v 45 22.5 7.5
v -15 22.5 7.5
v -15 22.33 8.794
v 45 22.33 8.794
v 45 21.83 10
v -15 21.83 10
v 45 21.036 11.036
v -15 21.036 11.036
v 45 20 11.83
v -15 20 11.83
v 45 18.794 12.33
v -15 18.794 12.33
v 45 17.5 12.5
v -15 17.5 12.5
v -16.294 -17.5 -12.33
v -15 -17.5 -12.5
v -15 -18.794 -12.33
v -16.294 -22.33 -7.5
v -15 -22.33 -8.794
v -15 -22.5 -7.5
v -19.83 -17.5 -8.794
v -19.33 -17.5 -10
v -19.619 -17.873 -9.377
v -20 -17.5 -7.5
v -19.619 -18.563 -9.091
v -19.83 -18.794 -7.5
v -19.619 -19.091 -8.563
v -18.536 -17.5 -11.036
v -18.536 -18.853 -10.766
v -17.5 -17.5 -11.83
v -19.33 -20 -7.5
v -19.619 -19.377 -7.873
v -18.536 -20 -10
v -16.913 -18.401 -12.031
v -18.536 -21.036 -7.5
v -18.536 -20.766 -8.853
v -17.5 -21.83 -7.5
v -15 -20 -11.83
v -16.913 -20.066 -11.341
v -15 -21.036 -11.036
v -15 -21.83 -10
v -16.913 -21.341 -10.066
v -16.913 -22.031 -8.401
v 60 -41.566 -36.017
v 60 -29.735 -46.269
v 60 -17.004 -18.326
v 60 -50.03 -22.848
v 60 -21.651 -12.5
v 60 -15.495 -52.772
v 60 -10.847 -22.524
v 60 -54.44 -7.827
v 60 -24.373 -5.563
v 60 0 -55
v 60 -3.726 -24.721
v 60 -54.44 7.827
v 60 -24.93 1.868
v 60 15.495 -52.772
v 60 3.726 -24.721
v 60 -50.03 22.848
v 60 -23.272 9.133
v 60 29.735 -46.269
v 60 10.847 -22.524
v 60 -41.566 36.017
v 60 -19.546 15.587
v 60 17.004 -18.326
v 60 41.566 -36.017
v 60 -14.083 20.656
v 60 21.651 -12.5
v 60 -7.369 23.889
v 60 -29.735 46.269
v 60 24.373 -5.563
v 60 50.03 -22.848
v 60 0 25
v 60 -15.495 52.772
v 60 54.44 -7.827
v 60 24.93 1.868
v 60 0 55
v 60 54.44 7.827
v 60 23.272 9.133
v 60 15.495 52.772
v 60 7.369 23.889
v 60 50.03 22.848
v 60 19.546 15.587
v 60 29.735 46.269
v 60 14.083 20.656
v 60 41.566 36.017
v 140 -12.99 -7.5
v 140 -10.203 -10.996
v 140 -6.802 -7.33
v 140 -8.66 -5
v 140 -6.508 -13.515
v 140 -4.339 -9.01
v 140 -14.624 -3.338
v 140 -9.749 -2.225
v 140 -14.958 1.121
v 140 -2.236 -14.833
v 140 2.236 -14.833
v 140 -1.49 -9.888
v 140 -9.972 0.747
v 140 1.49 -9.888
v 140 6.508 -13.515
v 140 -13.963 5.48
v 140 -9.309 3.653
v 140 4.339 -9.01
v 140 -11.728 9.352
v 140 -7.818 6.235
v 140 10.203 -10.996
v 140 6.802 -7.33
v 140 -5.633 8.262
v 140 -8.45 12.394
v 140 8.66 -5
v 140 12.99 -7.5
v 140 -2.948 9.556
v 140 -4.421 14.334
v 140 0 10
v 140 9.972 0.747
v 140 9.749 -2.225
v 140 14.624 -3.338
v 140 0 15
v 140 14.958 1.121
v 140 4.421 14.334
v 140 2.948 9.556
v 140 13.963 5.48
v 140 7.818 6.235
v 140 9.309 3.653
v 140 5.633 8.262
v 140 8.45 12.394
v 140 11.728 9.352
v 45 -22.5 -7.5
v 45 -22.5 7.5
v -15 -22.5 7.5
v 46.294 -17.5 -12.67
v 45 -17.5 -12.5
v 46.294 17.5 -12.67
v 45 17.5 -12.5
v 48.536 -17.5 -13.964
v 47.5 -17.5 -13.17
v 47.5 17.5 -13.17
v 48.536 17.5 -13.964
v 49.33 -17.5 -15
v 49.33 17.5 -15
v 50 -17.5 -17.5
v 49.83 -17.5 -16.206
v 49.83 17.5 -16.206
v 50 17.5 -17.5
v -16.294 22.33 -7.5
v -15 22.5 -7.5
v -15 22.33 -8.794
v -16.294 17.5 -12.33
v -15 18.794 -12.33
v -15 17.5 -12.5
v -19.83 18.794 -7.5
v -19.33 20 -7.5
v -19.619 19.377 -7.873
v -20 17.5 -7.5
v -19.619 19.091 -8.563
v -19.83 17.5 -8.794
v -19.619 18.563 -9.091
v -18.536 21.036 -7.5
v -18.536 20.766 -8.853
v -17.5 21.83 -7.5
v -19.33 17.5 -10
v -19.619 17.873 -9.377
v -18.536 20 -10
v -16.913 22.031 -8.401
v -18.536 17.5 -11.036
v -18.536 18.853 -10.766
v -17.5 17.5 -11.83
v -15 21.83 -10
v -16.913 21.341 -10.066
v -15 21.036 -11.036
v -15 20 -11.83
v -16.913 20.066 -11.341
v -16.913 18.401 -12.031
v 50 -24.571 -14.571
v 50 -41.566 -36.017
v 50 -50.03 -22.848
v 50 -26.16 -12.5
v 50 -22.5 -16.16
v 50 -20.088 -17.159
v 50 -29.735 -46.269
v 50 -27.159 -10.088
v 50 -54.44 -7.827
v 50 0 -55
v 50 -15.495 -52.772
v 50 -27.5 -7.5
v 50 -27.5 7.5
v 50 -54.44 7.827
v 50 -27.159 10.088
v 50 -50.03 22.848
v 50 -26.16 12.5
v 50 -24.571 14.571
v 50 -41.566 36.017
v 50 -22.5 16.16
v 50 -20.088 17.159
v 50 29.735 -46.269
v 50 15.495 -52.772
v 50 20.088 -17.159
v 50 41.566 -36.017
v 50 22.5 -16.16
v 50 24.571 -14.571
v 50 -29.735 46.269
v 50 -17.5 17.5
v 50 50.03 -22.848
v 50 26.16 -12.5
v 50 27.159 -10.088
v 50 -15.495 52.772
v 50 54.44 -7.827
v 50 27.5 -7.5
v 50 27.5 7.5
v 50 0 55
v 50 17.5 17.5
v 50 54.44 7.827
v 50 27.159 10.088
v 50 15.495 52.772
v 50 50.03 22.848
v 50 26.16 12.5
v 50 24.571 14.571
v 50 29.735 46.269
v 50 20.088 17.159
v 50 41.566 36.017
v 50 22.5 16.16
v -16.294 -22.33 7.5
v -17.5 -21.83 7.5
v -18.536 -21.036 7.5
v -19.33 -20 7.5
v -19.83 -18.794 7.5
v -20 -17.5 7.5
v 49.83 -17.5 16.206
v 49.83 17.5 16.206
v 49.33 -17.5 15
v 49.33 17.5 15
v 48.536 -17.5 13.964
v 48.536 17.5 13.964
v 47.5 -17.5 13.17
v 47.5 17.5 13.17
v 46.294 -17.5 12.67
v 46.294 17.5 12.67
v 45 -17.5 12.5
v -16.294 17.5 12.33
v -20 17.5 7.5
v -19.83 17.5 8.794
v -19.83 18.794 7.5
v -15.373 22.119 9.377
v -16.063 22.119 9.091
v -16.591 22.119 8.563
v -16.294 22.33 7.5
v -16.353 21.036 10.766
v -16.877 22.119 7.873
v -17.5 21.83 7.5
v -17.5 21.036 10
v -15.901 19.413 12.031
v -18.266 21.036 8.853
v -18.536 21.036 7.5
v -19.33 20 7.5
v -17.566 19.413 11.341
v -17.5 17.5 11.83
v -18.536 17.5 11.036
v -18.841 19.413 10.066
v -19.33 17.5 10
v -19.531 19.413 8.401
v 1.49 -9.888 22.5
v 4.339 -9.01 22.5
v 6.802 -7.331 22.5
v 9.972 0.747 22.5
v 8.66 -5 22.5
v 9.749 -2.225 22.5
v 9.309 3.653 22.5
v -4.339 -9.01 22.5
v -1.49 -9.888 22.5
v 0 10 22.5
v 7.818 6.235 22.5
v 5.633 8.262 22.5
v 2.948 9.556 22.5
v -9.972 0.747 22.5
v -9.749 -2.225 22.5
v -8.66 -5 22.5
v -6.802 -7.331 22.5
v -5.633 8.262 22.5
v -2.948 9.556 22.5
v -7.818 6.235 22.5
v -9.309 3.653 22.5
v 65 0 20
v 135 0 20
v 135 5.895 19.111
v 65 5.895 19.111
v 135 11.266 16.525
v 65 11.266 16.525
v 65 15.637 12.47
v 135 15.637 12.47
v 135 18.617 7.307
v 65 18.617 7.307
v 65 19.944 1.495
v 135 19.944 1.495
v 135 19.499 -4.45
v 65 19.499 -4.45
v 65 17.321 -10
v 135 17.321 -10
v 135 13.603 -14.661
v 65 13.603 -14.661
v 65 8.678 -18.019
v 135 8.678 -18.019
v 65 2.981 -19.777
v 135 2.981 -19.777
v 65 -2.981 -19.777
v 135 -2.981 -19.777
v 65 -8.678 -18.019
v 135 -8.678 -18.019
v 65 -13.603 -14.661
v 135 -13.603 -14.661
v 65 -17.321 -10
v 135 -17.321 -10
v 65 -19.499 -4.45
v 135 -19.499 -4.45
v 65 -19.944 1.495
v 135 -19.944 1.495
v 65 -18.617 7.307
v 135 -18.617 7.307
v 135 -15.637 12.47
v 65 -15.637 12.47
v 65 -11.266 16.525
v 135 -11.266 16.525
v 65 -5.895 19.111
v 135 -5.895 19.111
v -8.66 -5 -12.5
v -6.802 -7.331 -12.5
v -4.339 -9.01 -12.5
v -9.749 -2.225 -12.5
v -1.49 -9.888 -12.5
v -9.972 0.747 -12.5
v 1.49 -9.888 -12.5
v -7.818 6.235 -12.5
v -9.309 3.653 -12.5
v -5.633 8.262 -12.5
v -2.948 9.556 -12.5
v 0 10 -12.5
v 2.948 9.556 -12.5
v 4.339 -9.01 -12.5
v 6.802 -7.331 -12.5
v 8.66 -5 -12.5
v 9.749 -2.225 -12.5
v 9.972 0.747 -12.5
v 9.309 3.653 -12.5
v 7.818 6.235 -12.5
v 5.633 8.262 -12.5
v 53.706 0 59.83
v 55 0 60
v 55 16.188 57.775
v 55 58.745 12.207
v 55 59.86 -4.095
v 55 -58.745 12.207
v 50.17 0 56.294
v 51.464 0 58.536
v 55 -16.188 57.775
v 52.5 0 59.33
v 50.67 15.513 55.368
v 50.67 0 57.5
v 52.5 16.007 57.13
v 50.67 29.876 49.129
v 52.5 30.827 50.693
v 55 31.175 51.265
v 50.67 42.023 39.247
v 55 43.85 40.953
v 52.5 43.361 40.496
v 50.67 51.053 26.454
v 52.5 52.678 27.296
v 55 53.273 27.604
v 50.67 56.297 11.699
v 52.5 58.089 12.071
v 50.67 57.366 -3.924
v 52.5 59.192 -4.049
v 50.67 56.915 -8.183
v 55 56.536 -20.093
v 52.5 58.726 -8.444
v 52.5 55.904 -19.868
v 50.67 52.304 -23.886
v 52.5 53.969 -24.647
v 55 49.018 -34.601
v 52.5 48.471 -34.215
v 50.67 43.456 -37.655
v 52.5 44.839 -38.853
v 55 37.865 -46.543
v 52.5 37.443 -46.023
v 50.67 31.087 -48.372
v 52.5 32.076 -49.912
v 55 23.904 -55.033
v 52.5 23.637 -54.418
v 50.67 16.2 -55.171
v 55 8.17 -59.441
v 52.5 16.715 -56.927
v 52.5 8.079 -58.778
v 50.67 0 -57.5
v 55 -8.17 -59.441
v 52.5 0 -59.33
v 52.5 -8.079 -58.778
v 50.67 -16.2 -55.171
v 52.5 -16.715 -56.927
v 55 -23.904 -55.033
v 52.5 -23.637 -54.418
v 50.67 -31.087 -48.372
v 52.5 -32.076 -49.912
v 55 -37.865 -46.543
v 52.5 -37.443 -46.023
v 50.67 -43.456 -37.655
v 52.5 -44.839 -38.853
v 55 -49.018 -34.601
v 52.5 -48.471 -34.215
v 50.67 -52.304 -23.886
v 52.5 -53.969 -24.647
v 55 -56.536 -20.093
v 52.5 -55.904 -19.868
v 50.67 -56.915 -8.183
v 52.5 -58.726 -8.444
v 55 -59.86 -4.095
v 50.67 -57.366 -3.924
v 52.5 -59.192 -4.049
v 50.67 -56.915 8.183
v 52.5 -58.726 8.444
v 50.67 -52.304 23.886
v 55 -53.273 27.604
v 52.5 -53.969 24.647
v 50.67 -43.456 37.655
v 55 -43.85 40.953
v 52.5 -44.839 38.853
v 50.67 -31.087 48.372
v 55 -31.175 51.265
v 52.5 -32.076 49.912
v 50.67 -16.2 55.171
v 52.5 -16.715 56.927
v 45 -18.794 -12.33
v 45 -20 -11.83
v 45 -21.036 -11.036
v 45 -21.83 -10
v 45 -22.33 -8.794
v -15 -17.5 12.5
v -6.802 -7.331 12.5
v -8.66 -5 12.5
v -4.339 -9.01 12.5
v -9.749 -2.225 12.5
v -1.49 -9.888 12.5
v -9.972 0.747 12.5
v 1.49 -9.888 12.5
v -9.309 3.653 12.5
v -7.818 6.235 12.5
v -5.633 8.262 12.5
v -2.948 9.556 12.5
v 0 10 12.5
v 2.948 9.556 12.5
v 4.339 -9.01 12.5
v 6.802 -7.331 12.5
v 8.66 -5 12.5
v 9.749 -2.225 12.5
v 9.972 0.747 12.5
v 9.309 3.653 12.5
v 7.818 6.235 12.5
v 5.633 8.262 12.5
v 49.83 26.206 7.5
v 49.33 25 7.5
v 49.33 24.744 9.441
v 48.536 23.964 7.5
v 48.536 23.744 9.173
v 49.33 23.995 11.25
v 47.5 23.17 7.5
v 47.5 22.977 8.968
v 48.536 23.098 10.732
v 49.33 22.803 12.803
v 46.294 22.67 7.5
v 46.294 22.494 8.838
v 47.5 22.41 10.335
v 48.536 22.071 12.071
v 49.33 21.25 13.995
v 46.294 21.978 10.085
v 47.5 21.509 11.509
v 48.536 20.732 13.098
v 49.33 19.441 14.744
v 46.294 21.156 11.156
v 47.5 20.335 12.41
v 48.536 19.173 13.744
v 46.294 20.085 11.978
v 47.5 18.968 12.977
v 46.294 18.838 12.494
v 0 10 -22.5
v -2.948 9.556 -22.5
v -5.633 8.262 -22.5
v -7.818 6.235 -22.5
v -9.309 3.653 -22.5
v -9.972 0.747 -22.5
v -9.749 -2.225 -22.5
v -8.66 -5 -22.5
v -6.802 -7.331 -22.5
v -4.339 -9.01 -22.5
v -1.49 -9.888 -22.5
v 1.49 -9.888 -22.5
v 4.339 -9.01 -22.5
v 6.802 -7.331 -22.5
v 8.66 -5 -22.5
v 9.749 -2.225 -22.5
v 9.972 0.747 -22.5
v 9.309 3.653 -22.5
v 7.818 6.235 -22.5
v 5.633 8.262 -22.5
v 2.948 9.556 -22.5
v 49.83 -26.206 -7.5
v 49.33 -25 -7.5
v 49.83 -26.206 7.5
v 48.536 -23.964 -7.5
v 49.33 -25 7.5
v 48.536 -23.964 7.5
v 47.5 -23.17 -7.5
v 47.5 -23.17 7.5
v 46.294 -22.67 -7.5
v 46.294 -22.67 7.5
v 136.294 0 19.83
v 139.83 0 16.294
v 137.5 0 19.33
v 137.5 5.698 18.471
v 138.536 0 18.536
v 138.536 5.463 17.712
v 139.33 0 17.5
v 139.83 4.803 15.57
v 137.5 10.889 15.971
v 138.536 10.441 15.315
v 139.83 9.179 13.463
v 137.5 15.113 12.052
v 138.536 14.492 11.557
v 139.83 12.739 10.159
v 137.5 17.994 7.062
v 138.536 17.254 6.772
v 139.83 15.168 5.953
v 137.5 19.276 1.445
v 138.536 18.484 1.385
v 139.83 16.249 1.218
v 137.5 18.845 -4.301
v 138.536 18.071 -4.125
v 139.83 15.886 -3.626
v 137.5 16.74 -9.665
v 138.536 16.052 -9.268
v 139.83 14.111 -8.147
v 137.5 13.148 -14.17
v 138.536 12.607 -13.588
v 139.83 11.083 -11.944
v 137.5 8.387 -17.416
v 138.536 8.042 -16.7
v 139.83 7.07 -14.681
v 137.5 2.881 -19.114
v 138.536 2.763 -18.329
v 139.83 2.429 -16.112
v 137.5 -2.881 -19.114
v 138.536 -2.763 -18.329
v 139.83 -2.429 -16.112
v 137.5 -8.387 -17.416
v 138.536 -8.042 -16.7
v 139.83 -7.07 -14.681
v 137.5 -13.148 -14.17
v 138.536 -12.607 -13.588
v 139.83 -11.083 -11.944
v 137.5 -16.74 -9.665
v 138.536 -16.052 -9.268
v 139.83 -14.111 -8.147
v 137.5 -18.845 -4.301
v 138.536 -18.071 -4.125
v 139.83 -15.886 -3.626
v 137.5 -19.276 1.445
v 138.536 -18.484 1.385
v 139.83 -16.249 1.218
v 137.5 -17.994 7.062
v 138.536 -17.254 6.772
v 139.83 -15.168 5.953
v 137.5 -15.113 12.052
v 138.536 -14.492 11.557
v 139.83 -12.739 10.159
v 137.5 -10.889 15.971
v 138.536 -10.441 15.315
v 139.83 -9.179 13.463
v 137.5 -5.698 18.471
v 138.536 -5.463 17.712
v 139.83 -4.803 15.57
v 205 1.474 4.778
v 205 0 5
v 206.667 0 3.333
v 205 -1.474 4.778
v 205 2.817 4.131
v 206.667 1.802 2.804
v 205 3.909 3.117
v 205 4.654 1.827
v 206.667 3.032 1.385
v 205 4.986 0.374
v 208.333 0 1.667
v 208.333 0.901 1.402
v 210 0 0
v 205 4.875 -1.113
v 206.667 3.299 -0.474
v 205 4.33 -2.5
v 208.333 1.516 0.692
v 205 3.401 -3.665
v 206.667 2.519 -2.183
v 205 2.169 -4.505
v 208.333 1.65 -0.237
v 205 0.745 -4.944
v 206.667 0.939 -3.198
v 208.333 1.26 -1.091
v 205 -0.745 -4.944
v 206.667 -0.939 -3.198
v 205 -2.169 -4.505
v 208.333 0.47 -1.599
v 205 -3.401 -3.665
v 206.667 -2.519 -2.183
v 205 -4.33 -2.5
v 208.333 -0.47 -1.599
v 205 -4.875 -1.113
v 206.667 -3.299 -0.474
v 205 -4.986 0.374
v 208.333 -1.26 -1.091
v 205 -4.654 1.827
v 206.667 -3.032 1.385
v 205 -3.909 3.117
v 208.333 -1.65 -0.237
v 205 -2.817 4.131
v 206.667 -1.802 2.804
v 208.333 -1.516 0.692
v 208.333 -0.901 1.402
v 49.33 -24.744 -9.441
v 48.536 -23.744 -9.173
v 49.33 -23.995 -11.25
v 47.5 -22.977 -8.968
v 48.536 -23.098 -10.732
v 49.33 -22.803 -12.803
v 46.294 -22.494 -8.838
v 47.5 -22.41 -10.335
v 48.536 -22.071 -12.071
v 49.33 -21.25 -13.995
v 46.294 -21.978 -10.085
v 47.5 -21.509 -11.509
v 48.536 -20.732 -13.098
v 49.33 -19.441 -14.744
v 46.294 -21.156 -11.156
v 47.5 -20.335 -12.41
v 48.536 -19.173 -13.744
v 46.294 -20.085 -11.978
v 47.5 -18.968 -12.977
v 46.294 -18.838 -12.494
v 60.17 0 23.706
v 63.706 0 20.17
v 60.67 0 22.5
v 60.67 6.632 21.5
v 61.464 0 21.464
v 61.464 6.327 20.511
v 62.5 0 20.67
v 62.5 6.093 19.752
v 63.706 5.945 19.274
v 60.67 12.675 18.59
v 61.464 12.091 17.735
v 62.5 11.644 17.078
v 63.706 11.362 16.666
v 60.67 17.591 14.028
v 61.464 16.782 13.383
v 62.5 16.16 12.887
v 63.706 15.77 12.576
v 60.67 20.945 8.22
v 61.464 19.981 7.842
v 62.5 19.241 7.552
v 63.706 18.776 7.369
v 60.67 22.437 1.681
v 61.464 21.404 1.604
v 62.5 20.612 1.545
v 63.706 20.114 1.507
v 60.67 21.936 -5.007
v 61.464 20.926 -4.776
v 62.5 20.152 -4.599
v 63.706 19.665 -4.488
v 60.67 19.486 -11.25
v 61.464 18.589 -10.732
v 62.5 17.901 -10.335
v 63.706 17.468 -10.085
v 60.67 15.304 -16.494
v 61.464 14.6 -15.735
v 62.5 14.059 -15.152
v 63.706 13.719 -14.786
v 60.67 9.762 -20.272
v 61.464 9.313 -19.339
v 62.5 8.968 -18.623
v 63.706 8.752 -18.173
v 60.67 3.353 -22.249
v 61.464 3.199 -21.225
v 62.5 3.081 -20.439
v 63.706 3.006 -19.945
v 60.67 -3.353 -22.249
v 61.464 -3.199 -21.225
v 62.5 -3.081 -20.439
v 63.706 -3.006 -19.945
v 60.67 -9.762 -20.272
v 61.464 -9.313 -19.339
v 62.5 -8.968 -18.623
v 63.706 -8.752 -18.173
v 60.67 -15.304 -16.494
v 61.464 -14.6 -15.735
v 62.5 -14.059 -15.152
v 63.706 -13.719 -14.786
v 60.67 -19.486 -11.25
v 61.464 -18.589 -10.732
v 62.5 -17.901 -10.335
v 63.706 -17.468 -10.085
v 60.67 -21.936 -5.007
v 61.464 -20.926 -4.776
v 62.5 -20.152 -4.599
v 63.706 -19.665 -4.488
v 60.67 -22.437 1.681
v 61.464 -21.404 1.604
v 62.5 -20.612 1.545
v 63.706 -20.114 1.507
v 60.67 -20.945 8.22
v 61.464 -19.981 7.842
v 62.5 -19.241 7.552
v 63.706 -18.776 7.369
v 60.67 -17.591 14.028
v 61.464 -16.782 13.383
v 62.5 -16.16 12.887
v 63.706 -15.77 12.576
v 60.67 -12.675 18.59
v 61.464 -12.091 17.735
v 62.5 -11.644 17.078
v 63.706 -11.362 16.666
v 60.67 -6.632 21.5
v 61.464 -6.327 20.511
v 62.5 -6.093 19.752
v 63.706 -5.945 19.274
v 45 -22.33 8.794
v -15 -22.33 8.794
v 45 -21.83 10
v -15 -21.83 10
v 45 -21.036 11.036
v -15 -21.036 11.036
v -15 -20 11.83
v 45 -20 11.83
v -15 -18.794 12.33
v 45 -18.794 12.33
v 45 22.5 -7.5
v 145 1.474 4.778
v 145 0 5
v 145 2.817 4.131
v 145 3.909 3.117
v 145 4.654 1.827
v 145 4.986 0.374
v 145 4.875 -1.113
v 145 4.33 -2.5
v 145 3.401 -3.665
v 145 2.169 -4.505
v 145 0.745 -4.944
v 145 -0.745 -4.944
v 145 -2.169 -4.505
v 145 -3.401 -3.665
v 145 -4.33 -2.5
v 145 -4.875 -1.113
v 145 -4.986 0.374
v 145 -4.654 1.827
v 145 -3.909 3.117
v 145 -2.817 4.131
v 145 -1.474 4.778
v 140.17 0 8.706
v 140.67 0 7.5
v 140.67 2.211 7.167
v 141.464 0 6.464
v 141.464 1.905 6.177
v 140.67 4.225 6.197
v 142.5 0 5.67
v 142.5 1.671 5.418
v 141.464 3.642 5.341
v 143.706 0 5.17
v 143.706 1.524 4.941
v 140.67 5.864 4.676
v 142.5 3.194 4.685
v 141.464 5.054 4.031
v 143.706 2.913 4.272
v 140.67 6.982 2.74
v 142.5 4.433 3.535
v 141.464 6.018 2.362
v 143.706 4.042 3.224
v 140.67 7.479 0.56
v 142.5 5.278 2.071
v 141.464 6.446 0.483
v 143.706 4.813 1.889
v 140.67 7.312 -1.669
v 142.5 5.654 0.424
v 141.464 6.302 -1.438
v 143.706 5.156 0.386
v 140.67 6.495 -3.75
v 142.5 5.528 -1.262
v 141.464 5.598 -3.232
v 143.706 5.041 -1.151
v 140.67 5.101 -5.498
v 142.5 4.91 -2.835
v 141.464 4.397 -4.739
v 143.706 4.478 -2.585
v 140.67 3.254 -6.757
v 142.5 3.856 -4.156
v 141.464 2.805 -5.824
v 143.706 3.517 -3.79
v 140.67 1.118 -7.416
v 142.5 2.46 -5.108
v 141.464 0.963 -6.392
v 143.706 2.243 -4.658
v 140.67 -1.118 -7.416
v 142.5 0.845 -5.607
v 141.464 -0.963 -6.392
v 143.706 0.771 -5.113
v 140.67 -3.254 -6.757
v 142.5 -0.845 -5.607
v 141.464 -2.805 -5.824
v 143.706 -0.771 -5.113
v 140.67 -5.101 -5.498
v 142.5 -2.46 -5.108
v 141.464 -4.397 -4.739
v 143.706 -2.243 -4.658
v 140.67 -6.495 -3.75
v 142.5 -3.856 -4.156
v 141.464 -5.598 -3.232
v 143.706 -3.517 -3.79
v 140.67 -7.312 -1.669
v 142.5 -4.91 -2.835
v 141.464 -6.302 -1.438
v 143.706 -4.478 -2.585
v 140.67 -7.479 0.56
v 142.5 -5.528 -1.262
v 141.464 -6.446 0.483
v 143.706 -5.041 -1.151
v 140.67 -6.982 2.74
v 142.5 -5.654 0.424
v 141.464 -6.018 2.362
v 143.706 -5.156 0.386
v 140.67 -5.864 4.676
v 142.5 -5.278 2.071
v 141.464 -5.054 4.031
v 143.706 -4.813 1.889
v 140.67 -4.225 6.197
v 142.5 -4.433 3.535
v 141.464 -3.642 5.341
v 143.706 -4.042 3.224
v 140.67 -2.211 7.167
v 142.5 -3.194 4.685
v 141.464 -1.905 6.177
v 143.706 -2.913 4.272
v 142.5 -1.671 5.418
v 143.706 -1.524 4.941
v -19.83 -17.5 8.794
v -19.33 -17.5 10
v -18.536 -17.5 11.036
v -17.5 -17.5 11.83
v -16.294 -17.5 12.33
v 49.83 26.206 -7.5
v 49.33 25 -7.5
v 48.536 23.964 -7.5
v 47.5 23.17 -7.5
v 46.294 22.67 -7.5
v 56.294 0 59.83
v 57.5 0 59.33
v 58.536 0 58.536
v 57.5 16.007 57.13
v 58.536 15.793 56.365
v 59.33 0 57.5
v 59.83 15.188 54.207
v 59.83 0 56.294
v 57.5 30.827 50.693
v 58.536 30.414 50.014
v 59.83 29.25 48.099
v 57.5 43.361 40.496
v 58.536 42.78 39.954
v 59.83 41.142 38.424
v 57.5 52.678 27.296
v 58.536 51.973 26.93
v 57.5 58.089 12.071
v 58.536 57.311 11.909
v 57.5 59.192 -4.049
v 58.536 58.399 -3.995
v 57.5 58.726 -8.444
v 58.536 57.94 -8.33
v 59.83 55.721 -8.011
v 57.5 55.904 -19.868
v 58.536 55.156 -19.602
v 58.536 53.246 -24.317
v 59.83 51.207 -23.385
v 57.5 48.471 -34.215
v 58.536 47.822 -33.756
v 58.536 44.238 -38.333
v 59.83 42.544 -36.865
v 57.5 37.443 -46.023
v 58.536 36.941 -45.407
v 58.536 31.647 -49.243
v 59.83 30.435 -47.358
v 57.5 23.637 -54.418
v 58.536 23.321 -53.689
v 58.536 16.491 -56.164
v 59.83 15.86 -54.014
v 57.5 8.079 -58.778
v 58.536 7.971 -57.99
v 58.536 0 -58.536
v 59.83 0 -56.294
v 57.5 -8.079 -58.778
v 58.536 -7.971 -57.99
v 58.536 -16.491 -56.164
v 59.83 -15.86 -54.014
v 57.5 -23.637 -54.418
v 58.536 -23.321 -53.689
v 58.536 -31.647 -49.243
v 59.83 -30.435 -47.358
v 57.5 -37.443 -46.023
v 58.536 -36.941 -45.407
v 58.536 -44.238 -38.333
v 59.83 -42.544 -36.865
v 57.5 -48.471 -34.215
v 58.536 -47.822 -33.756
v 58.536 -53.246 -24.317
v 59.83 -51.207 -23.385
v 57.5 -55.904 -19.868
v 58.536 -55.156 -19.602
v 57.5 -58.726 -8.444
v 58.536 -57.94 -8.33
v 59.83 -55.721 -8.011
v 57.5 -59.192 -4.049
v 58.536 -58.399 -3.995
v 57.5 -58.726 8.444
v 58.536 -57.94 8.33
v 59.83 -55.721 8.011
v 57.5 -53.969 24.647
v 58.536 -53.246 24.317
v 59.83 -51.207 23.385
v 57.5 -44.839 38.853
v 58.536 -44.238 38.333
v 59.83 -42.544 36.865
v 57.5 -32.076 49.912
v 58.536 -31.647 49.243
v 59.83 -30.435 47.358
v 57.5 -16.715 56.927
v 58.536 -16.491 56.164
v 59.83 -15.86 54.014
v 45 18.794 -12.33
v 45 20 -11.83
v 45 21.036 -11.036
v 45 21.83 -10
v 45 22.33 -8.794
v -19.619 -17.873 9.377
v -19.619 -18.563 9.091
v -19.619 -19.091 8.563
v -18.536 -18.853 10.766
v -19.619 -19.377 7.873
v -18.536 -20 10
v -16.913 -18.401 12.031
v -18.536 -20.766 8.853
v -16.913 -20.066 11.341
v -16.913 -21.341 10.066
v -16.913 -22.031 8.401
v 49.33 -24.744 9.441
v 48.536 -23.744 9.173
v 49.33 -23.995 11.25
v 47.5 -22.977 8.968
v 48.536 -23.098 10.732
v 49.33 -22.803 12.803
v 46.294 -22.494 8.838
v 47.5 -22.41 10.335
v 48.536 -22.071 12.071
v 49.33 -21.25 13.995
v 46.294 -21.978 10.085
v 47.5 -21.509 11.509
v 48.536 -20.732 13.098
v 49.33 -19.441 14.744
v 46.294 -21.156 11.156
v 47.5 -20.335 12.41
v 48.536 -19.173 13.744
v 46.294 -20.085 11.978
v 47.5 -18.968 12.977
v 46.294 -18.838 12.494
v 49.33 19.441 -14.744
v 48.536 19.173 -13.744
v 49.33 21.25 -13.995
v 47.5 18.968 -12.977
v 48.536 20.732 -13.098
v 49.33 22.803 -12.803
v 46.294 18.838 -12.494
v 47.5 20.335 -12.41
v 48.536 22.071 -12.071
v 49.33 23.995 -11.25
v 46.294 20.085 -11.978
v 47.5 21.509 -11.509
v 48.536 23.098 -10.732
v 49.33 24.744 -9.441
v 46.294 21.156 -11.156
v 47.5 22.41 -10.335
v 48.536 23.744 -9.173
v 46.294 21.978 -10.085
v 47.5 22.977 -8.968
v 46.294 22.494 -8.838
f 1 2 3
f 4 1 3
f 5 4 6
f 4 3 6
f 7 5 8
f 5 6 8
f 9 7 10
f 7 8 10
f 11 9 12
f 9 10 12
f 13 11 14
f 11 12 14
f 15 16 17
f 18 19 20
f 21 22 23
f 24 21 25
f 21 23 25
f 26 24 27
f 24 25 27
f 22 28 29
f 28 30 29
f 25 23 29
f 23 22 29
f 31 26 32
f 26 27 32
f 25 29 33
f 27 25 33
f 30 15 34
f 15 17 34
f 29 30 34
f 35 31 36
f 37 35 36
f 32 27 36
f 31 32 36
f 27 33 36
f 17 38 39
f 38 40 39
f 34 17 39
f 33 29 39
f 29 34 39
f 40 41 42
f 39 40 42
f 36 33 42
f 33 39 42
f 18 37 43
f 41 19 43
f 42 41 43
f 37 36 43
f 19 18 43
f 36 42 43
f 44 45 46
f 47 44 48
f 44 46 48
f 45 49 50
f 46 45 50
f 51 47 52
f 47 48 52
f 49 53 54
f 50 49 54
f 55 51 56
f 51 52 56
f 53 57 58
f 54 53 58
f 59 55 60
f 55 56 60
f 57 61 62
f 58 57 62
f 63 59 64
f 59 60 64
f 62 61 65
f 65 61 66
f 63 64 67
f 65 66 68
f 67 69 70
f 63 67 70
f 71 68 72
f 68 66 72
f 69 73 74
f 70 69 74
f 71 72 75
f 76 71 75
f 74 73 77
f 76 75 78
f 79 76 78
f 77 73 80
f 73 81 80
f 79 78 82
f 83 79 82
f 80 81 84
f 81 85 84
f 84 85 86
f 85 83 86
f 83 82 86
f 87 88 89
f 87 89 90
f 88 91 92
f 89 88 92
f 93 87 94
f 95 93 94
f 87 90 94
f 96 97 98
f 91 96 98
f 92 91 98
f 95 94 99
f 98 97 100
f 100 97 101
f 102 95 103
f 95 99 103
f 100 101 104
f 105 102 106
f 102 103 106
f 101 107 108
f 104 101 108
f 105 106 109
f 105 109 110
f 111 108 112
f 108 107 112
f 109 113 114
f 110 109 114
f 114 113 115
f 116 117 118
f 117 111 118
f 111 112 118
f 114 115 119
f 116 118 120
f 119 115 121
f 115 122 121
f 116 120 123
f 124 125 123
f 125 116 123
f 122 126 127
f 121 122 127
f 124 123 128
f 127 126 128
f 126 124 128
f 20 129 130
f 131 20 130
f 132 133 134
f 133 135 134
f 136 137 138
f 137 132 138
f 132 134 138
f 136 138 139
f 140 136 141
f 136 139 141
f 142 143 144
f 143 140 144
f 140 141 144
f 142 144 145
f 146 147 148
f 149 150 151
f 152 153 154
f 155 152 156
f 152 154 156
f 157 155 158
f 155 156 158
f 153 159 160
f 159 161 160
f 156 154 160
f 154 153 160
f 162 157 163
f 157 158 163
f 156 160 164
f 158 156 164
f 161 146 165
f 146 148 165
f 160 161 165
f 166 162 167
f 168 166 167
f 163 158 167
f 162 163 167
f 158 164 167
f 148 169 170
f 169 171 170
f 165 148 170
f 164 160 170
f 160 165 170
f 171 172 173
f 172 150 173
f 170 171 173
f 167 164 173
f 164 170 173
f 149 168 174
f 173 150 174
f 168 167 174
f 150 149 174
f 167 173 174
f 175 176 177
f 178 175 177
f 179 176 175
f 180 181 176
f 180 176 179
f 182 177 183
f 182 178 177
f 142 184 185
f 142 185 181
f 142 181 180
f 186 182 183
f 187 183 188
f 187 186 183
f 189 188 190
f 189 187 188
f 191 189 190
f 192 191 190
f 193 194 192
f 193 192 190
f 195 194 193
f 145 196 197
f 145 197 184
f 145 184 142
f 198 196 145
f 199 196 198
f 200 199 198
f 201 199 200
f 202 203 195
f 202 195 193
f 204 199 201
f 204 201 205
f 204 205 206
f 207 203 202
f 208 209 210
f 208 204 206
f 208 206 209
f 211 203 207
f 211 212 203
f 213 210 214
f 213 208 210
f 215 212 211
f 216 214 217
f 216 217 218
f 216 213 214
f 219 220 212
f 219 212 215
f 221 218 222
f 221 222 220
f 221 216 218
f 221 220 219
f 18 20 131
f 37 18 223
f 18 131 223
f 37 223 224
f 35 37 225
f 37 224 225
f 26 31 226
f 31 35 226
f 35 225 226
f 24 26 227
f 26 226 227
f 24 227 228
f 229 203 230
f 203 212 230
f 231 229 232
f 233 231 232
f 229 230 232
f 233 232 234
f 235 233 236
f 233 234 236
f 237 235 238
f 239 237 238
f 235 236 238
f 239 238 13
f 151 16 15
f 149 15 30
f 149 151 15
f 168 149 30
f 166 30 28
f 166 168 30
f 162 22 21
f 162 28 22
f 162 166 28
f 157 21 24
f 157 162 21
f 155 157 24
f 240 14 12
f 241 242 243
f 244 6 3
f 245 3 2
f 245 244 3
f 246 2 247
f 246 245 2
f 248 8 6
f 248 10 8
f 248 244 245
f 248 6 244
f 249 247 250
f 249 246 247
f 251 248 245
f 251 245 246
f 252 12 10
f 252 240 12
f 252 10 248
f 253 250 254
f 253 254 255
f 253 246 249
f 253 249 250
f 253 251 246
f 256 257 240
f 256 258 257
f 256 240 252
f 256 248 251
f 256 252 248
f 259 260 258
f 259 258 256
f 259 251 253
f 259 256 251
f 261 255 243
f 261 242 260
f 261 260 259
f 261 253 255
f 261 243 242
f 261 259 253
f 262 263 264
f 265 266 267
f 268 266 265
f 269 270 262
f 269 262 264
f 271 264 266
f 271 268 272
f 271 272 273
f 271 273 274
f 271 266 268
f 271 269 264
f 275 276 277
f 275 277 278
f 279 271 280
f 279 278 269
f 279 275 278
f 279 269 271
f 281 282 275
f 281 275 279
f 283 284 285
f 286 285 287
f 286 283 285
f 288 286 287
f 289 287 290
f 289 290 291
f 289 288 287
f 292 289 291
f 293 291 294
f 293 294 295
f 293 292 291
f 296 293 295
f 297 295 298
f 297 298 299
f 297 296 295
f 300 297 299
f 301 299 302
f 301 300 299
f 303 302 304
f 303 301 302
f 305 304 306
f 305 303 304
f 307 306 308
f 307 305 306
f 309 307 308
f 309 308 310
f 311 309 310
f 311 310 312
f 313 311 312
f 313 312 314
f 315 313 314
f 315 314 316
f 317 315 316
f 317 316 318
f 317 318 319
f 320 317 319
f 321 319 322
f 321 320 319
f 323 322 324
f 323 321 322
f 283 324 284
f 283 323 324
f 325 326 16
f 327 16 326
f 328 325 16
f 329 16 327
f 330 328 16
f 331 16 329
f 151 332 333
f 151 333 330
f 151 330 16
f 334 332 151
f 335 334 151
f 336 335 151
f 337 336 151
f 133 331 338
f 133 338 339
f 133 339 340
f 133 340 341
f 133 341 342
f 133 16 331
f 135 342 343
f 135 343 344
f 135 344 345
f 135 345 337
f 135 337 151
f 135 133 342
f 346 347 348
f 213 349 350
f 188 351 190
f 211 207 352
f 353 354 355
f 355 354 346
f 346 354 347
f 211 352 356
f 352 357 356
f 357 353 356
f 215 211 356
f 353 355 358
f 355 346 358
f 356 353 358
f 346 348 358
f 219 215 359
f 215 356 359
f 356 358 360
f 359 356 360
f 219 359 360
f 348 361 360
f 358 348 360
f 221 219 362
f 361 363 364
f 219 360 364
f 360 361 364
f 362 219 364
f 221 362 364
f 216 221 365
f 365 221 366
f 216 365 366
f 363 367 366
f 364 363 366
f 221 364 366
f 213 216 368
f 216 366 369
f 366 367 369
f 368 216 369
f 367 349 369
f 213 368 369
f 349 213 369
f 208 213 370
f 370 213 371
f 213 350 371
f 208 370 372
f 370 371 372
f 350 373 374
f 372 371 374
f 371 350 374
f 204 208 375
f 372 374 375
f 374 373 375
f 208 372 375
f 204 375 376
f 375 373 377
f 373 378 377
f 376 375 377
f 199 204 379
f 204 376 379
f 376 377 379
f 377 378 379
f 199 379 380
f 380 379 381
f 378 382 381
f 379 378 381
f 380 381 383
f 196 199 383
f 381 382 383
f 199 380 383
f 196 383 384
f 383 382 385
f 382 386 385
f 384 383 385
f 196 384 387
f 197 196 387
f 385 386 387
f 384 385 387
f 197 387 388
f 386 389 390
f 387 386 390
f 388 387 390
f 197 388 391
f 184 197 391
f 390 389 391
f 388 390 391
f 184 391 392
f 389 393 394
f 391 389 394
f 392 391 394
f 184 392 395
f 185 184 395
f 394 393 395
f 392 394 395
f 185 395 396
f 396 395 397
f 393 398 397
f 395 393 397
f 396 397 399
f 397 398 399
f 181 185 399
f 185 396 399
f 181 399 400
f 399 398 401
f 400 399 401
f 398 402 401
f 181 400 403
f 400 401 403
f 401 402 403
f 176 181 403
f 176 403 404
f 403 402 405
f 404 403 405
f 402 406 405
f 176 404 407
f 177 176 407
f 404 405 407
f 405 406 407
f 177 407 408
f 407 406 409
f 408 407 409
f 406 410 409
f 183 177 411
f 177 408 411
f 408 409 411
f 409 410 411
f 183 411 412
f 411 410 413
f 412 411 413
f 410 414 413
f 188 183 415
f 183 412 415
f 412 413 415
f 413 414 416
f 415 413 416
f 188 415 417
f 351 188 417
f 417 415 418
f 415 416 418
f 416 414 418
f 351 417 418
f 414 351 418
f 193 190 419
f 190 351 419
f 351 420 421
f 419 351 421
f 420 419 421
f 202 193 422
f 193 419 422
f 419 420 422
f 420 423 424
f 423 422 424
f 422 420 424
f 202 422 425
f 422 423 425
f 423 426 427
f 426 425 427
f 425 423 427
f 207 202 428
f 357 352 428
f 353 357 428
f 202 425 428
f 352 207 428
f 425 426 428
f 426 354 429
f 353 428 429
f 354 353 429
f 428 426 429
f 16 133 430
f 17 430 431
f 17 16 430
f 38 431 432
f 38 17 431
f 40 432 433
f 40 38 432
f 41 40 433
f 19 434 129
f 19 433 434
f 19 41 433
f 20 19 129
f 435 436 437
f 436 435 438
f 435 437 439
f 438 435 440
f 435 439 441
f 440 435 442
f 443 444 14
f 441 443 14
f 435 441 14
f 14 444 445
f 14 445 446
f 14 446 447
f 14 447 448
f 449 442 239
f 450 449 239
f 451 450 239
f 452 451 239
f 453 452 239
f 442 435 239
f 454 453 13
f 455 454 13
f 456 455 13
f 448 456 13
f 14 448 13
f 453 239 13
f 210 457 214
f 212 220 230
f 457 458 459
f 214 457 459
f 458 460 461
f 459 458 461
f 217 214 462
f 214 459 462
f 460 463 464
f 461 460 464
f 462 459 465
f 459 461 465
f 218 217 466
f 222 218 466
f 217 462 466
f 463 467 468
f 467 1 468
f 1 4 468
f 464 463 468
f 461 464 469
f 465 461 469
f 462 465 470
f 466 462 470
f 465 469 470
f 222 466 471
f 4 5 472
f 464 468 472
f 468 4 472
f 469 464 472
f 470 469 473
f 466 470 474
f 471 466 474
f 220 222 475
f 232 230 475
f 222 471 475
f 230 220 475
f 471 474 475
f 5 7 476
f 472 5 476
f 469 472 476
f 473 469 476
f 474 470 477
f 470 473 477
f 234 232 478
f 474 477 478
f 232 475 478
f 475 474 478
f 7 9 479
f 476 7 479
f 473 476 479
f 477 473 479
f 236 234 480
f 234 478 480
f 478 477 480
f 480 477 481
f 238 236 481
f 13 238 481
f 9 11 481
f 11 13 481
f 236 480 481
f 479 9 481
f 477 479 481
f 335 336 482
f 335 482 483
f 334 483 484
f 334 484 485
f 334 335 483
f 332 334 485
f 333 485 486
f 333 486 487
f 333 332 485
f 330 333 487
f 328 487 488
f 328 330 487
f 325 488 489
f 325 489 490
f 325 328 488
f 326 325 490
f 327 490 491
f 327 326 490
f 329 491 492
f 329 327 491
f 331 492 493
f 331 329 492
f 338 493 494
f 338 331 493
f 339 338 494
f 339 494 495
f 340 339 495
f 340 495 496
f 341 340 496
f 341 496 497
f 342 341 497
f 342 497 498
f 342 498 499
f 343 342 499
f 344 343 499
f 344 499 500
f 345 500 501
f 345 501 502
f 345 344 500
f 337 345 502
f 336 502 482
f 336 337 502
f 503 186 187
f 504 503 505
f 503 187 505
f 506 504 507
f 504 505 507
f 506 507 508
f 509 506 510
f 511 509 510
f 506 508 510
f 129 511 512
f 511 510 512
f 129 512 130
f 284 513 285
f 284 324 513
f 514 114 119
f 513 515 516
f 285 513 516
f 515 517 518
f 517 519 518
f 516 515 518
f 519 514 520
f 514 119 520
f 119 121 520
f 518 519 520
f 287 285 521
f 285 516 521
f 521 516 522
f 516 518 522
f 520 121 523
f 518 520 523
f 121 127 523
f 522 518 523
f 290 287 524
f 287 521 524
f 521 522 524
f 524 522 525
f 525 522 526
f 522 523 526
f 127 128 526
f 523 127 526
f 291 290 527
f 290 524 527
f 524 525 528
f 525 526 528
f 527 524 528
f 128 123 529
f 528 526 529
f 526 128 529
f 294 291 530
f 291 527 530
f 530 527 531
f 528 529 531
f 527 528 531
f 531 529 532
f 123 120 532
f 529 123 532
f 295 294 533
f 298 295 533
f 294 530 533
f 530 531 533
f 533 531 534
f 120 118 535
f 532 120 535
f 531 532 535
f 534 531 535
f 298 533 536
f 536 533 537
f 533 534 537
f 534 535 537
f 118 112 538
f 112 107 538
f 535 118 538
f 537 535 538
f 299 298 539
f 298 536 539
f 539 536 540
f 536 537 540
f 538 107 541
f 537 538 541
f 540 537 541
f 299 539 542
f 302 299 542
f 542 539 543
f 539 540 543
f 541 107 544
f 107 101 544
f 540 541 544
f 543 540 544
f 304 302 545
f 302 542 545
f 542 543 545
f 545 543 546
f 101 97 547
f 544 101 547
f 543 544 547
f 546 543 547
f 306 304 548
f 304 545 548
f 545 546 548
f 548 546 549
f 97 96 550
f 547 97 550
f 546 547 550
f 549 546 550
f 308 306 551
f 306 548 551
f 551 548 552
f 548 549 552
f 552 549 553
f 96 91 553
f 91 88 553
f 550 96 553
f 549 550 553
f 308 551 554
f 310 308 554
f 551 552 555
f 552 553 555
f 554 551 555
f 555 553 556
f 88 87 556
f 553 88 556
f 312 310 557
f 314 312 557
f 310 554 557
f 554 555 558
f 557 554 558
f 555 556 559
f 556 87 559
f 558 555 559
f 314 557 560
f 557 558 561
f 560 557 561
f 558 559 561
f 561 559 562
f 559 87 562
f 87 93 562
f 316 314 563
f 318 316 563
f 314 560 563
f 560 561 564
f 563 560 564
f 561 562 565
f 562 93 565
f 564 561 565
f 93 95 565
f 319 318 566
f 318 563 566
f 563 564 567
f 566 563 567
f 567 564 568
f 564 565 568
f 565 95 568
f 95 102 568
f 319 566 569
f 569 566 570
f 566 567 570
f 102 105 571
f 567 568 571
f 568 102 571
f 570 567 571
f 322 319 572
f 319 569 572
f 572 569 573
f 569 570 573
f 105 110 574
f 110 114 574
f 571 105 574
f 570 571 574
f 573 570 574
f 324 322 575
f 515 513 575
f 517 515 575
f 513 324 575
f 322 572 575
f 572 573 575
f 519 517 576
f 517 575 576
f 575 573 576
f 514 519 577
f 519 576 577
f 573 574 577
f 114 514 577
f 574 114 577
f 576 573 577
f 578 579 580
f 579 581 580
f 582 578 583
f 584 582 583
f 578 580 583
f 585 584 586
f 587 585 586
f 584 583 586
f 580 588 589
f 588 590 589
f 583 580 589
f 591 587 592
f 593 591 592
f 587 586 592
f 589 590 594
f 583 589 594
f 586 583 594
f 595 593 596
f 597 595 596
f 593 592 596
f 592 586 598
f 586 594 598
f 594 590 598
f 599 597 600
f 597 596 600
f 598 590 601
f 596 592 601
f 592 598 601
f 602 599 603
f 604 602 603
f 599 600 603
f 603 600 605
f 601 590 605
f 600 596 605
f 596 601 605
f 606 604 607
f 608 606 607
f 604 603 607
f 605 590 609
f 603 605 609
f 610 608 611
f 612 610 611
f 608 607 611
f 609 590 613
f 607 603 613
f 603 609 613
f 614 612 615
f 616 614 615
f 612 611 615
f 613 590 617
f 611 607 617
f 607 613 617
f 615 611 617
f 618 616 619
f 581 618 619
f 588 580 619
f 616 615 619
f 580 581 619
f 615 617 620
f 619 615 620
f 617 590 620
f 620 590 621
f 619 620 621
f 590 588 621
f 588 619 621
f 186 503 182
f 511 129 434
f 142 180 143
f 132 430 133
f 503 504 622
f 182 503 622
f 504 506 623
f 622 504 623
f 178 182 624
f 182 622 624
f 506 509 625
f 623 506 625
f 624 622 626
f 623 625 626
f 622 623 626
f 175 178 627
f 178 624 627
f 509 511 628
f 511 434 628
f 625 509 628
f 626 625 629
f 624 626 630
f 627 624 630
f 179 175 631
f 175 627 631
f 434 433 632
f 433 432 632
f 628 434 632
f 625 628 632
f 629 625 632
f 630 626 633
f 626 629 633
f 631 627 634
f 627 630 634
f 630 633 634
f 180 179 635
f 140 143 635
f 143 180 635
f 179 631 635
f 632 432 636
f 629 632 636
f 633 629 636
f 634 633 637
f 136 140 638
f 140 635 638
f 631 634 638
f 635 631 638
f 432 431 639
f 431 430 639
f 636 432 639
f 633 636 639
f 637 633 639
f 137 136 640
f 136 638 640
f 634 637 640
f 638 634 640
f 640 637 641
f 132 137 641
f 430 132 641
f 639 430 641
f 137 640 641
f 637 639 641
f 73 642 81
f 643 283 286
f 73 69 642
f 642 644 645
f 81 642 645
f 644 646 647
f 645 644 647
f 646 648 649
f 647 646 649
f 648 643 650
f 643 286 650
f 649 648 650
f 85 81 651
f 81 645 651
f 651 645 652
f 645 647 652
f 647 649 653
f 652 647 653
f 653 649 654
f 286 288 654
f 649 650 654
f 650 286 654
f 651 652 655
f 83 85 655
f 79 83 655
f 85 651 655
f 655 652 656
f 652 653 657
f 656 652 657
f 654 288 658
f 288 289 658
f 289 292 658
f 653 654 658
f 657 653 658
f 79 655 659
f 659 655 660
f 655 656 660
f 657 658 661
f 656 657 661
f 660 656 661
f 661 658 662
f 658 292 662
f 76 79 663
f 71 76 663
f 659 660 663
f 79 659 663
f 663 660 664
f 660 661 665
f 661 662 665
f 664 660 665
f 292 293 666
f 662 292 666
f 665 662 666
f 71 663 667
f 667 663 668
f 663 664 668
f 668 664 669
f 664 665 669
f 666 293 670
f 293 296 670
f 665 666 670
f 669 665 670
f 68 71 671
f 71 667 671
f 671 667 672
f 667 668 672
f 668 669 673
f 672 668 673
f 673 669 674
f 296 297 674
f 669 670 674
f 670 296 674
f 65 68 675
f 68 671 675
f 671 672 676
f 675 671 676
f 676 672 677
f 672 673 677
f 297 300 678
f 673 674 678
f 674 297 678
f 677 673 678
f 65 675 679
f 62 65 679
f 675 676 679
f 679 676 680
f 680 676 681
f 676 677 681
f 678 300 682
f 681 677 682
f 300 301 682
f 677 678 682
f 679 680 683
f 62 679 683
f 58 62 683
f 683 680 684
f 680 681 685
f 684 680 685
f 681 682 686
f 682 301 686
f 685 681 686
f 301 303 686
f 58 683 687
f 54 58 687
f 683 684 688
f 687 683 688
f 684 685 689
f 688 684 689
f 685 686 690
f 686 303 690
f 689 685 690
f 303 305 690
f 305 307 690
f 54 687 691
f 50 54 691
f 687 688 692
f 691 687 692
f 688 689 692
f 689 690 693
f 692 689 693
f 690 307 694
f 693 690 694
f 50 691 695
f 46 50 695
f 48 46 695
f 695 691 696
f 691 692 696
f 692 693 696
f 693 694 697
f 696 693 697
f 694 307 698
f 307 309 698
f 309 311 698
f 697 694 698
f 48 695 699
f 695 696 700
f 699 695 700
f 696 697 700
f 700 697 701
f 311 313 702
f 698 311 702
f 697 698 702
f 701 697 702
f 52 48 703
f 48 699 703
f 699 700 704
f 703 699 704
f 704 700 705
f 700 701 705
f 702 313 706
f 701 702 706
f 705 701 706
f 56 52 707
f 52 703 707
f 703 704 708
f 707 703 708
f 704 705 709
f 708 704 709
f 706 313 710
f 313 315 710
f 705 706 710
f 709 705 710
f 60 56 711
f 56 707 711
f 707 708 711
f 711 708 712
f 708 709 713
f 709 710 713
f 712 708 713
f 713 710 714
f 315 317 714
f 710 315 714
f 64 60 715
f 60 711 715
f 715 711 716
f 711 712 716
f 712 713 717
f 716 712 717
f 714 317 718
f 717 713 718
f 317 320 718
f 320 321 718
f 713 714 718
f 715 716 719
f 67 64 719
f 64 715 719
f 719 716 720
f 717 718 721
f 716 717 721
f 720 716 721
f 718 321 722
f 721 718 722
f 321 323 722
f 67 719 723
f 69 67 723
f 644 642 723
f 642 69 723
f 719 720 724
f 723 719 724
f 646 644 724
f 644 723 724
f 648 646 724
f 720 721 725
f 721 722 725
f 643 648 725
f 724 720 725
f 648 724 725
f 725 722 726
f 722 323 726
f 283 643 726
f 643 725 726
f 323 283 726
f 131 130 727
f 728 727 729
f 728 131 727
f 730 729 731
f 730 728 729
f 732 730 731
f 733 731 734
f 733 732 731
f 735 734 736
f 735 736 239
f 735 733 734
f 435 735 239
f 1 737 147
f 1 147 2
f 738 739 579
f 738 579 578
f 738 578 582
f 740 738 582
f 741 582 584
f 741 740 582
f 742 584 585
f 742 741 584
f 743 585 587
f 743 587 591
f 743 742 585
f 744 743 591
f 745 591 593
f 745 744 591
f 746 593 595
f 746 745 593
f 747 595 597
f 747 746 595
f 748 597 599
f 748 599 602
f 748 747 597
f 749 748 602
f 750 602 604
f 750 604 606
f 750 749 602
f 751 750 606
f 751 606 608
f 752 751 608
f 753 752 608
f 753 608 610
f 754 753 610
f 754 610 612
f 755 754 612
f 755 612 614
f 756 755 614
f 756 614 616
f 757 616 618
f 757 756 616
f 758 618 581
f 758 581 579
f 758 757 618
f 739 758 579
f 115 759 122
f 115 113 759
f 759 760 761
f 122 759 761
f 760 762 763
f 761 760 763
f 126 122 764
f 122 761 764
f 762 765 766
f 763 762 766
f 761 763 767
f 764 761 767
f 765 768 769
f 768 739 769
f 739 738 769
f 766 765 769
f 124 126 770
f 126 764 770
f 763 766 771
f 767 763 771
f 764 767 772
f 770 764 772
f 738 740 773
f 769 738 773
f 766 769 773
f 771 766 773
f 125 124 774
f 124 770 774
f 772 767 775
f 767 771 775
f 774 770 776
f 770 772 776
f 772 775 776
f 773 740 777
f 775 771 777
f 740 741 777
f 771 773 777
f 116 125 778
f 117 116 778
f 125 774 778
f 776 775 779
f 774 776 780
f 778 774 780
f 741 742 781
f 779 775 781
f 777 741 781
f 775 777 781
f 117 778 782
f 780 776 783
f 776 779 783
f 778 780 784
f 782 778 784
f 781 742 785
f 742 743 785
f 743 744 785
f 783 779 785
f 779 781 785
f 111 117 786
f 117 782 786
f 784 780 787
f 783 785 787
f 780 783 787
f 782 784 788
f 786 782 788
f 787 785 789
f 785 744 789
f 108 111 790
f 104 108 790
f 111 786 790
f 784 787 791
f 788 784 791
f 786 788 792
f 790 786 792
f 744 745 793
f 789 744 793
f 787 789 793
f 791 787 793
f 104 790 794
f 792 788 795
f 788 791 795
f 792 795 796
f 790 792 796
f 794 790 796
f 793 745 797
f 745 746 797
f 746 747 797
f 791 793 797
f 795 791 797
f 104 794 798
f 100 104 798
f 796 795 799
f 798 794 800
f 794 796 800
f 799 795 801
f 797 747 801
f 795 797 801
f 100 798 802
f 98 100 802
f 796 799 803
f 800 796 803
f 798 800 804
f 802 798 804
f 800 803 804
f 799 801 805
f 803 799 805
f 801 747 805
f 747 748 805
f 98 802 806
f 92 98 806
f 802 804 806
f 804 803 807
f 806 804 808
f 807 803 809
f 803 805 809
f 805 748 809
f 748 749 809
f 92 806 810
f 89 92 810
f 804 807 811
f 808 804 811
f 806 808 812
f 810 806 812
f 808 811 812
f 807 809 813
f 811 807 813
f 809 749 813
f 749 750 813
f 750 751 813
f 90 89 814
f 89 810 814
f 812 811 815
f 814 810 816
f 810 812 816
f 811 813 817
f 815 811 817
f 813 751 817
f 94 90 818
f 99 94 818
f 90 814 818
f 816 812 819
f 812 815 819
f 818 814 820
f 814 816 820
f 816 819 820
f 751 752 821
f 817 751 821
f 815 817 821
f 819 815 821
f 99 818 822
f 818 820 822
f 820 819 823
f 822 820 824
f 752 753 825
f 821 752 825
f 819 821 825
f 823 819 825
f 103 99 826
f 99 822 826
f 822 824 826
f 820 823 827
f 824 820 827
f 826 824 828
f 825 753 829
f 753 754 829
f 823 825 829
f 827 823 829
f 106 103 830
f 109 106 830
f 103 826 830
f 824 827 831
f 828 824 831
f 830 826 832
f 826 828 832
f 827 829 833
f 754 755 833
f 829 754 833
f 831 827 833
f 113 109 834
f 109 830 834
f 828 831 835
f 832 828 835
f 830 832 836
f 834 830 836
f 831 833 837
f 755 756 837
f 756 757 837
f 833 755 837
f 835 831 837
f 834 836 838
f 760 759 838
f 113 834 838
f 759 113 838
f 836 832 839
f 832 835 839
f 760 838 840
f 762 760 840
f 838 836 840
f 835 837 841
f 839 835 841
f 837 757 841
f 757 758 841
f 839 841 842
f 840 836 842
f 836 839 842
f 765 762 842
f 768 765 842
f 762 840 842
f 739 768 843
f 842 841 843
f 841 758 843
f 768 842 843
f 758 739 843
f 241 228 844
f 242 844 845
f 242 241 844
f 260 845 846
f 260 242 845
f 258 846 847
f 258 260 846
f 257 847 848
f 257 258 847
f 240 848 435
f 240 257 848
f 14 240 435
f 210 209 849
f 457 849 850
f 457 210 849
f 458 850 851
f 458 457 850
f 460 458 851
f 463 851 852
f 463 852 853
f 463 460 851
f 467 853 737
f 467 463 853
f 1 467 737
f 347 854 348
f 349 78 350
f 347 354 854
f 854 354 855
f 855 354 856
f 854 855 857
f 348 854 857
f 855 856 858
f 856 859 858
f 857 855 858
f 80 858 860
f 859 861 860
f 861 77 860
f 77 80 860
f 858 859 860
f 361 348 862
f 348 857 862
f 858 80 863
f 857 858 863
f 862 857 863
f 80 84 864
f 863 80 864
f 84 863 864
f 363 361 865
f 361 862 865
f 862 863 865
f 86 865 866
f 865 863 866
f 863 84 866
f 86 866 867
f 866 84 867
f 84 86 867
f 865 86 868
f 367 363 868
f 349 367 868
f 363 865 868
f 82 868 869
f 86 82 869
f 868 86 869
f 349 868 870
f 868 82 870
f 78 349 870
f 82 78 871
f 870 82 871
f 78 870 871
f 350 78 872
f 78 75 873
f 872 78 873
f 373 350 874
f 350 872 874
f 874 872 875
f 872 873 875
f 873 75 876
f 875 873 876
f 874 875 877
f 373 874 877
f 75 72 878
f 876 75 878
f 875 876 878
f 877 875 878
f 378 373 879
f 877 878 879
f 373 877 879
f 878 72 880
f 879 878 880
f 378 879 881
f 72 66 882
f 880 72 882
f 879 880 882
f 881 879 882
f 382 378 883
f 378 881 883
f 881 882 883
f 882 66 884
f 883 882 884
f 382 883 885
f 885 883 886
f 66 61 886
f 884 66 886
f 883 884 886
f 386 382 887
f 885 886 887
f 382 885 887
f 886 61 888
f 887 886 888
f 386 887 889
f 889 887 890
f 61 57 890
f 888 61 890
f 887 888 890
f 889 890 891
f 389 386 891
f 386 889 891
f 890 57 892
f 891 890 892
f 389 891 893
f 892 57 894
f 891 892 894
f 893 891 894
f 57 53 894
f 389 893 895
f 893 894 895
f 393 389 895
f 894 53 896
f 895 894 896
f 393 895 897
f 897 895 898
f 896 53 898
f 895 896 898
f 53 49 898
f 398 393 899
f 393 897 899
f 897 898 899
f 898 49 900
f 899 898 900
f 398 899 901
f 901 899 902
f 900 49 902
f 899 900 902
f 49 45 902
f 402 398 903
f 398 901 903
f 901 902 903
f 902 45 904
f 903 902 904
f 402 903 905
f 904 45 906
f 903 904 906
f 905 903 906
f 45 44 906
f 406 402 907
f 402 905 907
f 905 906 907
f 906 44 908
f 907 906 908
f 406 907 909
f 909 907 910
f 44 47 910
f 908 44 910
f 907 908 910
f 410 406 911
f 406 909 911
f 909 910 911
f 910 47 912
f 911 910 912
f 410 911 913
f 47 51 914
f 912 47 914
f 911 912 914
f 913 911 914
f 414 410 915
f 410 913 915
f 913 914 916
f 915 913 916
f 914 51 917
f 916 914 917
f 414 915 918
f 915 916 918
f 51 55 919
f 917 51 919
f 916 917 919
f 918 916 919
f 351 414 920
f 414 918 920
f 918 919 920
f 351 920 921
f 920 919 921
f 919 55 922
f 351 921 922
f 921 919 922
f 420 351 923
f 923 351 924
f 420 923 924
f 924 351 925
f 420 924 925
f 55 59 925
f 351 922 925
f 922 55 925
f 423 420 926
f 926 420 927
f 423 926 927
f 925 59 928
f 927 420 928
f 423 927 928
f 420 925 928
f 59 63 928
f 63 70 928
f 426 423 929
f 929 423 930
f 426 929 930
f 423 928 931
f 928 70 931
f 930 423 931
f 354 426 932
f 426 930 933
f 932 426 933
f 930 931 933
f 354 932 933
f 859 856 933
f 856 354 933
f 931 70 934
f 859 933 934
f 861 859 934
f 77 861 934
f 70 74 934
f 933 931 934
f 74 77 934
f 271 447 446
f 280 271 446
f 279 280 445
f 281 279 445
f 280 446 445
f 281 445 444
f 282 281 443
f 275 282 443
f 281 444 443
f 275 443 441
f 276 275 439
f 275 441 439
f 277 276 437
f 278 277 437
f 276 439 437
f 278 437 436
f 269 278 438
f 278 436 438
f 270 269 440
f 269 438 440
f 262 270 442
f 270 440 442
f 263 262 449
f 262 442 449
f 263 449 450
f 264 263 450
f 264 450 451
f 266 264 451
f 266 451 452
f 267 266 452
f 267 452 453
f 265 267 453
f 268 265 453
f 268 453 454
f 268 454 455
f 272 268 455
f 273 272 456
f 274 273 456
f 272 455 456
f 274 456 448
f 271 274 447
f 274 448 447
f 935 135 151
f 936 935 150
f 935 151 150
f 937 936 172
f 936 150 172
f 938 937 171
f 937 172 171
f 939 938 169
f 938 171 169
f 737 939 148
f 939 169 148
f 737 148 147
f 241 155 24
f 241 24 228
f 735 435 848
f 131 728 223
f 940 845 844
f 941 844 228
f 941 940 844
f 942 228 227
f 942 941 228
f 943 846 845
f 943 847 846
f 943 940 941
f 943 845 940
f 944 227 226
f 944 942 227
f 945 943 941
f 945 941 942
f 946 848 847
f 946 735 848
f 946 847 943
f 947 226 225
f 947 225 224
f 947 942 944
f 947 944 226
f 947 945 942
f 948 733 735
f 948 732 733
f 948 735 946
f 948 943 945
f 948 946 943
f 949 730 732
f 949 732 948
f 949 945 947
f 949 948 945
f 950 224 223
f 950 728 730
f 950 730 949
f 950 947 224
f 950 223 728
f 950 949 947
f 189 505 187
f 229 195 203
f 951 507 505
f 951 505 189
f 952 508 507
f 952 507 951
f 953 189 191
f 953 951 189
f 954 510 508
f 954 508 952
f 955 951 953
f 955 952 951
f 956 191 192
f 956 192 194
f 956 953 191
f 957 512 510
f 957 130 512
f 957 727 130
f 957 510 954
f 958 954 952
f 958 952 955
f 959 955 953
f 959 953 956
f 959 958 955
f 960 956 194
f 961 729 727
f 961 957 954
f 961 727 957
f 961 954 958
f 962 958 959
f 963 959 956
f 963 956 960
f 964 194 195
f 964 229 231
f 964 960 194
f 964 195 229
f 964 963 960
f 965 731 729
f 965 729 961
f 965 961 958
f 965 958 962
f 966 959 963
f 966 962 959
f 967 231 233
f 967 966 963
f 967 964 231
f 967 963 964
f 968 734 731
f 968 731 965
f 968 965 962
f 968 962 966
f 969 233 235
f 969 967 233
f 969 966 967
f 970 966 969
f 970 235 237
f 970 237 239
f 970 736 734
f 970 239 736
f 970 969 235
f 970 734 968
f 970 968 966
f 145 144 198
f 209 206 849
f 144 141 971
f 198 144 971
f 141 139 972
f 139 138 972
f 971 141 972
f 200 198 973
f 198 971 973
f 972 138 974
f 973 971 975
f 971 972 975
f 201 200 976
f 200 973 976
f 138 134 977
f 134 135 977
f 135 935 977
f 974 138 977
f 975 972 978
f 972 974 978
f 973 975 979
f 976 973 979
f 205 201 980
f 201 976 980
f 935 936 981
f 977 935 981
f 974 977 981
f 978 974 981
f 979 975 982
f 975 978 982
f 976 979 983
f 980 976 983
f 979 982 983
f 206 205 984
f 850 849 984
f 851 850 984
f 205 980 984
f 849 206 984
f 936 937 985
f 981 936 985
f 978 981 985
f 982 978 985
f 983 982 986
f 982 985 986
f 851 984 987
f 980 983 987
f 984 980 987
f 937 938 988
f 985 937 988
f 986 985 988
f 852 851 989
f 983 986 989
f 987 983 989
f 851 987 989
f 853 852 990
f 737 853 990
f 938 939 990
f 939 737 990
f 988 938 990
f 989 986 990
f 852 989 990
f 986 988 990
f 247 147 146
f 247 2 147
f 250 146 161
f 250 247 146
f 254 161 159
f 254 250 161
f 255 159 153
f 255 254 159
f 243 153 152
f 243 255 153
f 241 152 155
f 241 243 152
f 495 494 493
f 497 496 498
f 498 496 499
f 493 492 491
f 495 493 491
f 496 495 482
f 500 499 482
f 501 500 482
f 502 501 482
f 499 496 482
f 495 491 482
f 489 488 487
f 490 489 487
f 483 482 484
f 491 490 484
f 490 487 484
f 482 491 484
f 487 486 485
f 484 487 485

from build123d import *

# Parameters (mm, degrees)
SKETCH1_R             = 60
SKETCH1_W             = 25
SKETCH1_H             = 45
BOSS_EXTRUDE1_DEPTH   = 10
SKETCH1_3_R           = 20
BOSS_EXTRUDE2_DEPTH   = 80
BOSS_EXTRUDE3_START   = -80
SKETCH1_4_R           = 5
BOSS_EXTRUDE3_DEPTH   = 70
CHAMFER1_SIZE         = 5
SKETCH1_5_W           = 25
SKETCH1_5_H           = 45
BOSS_EXTRUDE4_DEPTH   = 80
SKETCH3_R             = 10
BOSS_EXTRUDE5_DEPTH   = 10
FILLET1_R             = 5
BODY_MOVE_COPY4_ANGLE = 180


with BuildPart() as part:
    # Sketch1 → Boss-Extrude1 (new body)
    with BuildSketch(Plane(origin=(0, 0, 0), x_dir=(0, 0, -1), z_dir=(1, 0, 0))):
        Circle(SKETCH1_R)
        Rectangle(SKETCH1_W, SKETCH1_H, mode=Mode.SUBTRACT)
    extrude(amount=BOSS_EXTRUDE1_DEPTH)

    # Sketch1<3> → Boss-Extrude2 (add)
    with BuildSketch(Plane(origin=(0, 0, 0), x_dir=(0, 0, -1), z_dir=(1, 0, 0))):
        Circle(SKETCH1_3_R)
    extrude(amount=-BOSS_EXTRUDE2_DEPTH)

    # Sketch1<4> → Boss-Extrude3 (add)
    with BuildSketch(Plane(origin=(0, 0, 0), x_dir=(0, 0, -1), z_dir=(1, 0, 0)).offset(BOSS_EXTRUDE3_START)):
        Circle(SKETCH1_4_R)
    extrude(amount=-BOSS_EXTRUDE3_DEPTH)

    # Chamfer1
    chamfer1_edges = [part.edges().sort_by_distance(p)[0] for p in [
        (-150, 0, 5),
    ]]
    chamfer(chamfer1_edges, length=CHAMFER1_SIZE)

    # Sketch1<5> → Boss-Extrude4 (add)
    with BuildSketch(Plane(origin=(0, 0, 0), x_dir=(0, 0, -1), z_dir=(1, 0, 0))):
        Rectangle(SKETCH1_5_W, SKETCH1_5_H)
    extrude(amount=BOSS_EXTRUDE4_DEPTH)

    # Sketch3 → Boss-Extrude5 (add)
    with BuildSketch(Plane(origin=(0, 0, -12.5), x_dir=(-1, 0, 0), z_dir=(0, 0, -1))):
        with Locations(Location((-60, 0, 0), (0, 0, 90))):
            Circle(SKETCH3_R)
    boss_extrude5 = extrude(amount=BOSS_EXTRUDE5_DEPTH)

    # Mirror1: Boss-Extrude5 across plane
    add(boss_extrude5.mirror(Plane.XY))

    # Fillet1
    fillet1_edges = [part.edges().sort_by_distance(p)[0] for p in [
        (10, 22.5, 0),
        (10, 0, -12.5),
        (0, 0, 20),
        (-80, 0, 20),
        (10, 0, 60),
        (-80, 0, 5),
        (45, 22.5, 12.5),
        (45, -22.5, 12.5),
        (45, -22.5, -12.5),
        (80, 0, -12.5),
        (45, 22.5, -12.5),
        (80, 22.5, 0),
        (80, 0, 12.5),
        (80, -22.5, 0),
        (10, -22.5, 0),
        (0, 0, 60),
        (10, 0, 12.5),
    ]]
    fillet(fillet1_edges, radius=FILLET1_R - 0.0001)  # a hair under: the kernel refuses the full size


with BuildPart() as part_1:
    # Body-Move/Copy1: moved
    add(part.part.moved(Location((150, 0, 0))))


with BuildPart() as part_2:
    # Body-Move/Copy4: moved
    add(part_1.part.rotate(Axis((0, 0, 0), (0, 1, 0)), BODY_MOVE_COPY4_ANGLE))


with BuildPart() as part_3:
    # Body-Move/Copy5: moved
    add(part_2.part.moved(Location((210, 0, 0))))


solid = part_3.part
